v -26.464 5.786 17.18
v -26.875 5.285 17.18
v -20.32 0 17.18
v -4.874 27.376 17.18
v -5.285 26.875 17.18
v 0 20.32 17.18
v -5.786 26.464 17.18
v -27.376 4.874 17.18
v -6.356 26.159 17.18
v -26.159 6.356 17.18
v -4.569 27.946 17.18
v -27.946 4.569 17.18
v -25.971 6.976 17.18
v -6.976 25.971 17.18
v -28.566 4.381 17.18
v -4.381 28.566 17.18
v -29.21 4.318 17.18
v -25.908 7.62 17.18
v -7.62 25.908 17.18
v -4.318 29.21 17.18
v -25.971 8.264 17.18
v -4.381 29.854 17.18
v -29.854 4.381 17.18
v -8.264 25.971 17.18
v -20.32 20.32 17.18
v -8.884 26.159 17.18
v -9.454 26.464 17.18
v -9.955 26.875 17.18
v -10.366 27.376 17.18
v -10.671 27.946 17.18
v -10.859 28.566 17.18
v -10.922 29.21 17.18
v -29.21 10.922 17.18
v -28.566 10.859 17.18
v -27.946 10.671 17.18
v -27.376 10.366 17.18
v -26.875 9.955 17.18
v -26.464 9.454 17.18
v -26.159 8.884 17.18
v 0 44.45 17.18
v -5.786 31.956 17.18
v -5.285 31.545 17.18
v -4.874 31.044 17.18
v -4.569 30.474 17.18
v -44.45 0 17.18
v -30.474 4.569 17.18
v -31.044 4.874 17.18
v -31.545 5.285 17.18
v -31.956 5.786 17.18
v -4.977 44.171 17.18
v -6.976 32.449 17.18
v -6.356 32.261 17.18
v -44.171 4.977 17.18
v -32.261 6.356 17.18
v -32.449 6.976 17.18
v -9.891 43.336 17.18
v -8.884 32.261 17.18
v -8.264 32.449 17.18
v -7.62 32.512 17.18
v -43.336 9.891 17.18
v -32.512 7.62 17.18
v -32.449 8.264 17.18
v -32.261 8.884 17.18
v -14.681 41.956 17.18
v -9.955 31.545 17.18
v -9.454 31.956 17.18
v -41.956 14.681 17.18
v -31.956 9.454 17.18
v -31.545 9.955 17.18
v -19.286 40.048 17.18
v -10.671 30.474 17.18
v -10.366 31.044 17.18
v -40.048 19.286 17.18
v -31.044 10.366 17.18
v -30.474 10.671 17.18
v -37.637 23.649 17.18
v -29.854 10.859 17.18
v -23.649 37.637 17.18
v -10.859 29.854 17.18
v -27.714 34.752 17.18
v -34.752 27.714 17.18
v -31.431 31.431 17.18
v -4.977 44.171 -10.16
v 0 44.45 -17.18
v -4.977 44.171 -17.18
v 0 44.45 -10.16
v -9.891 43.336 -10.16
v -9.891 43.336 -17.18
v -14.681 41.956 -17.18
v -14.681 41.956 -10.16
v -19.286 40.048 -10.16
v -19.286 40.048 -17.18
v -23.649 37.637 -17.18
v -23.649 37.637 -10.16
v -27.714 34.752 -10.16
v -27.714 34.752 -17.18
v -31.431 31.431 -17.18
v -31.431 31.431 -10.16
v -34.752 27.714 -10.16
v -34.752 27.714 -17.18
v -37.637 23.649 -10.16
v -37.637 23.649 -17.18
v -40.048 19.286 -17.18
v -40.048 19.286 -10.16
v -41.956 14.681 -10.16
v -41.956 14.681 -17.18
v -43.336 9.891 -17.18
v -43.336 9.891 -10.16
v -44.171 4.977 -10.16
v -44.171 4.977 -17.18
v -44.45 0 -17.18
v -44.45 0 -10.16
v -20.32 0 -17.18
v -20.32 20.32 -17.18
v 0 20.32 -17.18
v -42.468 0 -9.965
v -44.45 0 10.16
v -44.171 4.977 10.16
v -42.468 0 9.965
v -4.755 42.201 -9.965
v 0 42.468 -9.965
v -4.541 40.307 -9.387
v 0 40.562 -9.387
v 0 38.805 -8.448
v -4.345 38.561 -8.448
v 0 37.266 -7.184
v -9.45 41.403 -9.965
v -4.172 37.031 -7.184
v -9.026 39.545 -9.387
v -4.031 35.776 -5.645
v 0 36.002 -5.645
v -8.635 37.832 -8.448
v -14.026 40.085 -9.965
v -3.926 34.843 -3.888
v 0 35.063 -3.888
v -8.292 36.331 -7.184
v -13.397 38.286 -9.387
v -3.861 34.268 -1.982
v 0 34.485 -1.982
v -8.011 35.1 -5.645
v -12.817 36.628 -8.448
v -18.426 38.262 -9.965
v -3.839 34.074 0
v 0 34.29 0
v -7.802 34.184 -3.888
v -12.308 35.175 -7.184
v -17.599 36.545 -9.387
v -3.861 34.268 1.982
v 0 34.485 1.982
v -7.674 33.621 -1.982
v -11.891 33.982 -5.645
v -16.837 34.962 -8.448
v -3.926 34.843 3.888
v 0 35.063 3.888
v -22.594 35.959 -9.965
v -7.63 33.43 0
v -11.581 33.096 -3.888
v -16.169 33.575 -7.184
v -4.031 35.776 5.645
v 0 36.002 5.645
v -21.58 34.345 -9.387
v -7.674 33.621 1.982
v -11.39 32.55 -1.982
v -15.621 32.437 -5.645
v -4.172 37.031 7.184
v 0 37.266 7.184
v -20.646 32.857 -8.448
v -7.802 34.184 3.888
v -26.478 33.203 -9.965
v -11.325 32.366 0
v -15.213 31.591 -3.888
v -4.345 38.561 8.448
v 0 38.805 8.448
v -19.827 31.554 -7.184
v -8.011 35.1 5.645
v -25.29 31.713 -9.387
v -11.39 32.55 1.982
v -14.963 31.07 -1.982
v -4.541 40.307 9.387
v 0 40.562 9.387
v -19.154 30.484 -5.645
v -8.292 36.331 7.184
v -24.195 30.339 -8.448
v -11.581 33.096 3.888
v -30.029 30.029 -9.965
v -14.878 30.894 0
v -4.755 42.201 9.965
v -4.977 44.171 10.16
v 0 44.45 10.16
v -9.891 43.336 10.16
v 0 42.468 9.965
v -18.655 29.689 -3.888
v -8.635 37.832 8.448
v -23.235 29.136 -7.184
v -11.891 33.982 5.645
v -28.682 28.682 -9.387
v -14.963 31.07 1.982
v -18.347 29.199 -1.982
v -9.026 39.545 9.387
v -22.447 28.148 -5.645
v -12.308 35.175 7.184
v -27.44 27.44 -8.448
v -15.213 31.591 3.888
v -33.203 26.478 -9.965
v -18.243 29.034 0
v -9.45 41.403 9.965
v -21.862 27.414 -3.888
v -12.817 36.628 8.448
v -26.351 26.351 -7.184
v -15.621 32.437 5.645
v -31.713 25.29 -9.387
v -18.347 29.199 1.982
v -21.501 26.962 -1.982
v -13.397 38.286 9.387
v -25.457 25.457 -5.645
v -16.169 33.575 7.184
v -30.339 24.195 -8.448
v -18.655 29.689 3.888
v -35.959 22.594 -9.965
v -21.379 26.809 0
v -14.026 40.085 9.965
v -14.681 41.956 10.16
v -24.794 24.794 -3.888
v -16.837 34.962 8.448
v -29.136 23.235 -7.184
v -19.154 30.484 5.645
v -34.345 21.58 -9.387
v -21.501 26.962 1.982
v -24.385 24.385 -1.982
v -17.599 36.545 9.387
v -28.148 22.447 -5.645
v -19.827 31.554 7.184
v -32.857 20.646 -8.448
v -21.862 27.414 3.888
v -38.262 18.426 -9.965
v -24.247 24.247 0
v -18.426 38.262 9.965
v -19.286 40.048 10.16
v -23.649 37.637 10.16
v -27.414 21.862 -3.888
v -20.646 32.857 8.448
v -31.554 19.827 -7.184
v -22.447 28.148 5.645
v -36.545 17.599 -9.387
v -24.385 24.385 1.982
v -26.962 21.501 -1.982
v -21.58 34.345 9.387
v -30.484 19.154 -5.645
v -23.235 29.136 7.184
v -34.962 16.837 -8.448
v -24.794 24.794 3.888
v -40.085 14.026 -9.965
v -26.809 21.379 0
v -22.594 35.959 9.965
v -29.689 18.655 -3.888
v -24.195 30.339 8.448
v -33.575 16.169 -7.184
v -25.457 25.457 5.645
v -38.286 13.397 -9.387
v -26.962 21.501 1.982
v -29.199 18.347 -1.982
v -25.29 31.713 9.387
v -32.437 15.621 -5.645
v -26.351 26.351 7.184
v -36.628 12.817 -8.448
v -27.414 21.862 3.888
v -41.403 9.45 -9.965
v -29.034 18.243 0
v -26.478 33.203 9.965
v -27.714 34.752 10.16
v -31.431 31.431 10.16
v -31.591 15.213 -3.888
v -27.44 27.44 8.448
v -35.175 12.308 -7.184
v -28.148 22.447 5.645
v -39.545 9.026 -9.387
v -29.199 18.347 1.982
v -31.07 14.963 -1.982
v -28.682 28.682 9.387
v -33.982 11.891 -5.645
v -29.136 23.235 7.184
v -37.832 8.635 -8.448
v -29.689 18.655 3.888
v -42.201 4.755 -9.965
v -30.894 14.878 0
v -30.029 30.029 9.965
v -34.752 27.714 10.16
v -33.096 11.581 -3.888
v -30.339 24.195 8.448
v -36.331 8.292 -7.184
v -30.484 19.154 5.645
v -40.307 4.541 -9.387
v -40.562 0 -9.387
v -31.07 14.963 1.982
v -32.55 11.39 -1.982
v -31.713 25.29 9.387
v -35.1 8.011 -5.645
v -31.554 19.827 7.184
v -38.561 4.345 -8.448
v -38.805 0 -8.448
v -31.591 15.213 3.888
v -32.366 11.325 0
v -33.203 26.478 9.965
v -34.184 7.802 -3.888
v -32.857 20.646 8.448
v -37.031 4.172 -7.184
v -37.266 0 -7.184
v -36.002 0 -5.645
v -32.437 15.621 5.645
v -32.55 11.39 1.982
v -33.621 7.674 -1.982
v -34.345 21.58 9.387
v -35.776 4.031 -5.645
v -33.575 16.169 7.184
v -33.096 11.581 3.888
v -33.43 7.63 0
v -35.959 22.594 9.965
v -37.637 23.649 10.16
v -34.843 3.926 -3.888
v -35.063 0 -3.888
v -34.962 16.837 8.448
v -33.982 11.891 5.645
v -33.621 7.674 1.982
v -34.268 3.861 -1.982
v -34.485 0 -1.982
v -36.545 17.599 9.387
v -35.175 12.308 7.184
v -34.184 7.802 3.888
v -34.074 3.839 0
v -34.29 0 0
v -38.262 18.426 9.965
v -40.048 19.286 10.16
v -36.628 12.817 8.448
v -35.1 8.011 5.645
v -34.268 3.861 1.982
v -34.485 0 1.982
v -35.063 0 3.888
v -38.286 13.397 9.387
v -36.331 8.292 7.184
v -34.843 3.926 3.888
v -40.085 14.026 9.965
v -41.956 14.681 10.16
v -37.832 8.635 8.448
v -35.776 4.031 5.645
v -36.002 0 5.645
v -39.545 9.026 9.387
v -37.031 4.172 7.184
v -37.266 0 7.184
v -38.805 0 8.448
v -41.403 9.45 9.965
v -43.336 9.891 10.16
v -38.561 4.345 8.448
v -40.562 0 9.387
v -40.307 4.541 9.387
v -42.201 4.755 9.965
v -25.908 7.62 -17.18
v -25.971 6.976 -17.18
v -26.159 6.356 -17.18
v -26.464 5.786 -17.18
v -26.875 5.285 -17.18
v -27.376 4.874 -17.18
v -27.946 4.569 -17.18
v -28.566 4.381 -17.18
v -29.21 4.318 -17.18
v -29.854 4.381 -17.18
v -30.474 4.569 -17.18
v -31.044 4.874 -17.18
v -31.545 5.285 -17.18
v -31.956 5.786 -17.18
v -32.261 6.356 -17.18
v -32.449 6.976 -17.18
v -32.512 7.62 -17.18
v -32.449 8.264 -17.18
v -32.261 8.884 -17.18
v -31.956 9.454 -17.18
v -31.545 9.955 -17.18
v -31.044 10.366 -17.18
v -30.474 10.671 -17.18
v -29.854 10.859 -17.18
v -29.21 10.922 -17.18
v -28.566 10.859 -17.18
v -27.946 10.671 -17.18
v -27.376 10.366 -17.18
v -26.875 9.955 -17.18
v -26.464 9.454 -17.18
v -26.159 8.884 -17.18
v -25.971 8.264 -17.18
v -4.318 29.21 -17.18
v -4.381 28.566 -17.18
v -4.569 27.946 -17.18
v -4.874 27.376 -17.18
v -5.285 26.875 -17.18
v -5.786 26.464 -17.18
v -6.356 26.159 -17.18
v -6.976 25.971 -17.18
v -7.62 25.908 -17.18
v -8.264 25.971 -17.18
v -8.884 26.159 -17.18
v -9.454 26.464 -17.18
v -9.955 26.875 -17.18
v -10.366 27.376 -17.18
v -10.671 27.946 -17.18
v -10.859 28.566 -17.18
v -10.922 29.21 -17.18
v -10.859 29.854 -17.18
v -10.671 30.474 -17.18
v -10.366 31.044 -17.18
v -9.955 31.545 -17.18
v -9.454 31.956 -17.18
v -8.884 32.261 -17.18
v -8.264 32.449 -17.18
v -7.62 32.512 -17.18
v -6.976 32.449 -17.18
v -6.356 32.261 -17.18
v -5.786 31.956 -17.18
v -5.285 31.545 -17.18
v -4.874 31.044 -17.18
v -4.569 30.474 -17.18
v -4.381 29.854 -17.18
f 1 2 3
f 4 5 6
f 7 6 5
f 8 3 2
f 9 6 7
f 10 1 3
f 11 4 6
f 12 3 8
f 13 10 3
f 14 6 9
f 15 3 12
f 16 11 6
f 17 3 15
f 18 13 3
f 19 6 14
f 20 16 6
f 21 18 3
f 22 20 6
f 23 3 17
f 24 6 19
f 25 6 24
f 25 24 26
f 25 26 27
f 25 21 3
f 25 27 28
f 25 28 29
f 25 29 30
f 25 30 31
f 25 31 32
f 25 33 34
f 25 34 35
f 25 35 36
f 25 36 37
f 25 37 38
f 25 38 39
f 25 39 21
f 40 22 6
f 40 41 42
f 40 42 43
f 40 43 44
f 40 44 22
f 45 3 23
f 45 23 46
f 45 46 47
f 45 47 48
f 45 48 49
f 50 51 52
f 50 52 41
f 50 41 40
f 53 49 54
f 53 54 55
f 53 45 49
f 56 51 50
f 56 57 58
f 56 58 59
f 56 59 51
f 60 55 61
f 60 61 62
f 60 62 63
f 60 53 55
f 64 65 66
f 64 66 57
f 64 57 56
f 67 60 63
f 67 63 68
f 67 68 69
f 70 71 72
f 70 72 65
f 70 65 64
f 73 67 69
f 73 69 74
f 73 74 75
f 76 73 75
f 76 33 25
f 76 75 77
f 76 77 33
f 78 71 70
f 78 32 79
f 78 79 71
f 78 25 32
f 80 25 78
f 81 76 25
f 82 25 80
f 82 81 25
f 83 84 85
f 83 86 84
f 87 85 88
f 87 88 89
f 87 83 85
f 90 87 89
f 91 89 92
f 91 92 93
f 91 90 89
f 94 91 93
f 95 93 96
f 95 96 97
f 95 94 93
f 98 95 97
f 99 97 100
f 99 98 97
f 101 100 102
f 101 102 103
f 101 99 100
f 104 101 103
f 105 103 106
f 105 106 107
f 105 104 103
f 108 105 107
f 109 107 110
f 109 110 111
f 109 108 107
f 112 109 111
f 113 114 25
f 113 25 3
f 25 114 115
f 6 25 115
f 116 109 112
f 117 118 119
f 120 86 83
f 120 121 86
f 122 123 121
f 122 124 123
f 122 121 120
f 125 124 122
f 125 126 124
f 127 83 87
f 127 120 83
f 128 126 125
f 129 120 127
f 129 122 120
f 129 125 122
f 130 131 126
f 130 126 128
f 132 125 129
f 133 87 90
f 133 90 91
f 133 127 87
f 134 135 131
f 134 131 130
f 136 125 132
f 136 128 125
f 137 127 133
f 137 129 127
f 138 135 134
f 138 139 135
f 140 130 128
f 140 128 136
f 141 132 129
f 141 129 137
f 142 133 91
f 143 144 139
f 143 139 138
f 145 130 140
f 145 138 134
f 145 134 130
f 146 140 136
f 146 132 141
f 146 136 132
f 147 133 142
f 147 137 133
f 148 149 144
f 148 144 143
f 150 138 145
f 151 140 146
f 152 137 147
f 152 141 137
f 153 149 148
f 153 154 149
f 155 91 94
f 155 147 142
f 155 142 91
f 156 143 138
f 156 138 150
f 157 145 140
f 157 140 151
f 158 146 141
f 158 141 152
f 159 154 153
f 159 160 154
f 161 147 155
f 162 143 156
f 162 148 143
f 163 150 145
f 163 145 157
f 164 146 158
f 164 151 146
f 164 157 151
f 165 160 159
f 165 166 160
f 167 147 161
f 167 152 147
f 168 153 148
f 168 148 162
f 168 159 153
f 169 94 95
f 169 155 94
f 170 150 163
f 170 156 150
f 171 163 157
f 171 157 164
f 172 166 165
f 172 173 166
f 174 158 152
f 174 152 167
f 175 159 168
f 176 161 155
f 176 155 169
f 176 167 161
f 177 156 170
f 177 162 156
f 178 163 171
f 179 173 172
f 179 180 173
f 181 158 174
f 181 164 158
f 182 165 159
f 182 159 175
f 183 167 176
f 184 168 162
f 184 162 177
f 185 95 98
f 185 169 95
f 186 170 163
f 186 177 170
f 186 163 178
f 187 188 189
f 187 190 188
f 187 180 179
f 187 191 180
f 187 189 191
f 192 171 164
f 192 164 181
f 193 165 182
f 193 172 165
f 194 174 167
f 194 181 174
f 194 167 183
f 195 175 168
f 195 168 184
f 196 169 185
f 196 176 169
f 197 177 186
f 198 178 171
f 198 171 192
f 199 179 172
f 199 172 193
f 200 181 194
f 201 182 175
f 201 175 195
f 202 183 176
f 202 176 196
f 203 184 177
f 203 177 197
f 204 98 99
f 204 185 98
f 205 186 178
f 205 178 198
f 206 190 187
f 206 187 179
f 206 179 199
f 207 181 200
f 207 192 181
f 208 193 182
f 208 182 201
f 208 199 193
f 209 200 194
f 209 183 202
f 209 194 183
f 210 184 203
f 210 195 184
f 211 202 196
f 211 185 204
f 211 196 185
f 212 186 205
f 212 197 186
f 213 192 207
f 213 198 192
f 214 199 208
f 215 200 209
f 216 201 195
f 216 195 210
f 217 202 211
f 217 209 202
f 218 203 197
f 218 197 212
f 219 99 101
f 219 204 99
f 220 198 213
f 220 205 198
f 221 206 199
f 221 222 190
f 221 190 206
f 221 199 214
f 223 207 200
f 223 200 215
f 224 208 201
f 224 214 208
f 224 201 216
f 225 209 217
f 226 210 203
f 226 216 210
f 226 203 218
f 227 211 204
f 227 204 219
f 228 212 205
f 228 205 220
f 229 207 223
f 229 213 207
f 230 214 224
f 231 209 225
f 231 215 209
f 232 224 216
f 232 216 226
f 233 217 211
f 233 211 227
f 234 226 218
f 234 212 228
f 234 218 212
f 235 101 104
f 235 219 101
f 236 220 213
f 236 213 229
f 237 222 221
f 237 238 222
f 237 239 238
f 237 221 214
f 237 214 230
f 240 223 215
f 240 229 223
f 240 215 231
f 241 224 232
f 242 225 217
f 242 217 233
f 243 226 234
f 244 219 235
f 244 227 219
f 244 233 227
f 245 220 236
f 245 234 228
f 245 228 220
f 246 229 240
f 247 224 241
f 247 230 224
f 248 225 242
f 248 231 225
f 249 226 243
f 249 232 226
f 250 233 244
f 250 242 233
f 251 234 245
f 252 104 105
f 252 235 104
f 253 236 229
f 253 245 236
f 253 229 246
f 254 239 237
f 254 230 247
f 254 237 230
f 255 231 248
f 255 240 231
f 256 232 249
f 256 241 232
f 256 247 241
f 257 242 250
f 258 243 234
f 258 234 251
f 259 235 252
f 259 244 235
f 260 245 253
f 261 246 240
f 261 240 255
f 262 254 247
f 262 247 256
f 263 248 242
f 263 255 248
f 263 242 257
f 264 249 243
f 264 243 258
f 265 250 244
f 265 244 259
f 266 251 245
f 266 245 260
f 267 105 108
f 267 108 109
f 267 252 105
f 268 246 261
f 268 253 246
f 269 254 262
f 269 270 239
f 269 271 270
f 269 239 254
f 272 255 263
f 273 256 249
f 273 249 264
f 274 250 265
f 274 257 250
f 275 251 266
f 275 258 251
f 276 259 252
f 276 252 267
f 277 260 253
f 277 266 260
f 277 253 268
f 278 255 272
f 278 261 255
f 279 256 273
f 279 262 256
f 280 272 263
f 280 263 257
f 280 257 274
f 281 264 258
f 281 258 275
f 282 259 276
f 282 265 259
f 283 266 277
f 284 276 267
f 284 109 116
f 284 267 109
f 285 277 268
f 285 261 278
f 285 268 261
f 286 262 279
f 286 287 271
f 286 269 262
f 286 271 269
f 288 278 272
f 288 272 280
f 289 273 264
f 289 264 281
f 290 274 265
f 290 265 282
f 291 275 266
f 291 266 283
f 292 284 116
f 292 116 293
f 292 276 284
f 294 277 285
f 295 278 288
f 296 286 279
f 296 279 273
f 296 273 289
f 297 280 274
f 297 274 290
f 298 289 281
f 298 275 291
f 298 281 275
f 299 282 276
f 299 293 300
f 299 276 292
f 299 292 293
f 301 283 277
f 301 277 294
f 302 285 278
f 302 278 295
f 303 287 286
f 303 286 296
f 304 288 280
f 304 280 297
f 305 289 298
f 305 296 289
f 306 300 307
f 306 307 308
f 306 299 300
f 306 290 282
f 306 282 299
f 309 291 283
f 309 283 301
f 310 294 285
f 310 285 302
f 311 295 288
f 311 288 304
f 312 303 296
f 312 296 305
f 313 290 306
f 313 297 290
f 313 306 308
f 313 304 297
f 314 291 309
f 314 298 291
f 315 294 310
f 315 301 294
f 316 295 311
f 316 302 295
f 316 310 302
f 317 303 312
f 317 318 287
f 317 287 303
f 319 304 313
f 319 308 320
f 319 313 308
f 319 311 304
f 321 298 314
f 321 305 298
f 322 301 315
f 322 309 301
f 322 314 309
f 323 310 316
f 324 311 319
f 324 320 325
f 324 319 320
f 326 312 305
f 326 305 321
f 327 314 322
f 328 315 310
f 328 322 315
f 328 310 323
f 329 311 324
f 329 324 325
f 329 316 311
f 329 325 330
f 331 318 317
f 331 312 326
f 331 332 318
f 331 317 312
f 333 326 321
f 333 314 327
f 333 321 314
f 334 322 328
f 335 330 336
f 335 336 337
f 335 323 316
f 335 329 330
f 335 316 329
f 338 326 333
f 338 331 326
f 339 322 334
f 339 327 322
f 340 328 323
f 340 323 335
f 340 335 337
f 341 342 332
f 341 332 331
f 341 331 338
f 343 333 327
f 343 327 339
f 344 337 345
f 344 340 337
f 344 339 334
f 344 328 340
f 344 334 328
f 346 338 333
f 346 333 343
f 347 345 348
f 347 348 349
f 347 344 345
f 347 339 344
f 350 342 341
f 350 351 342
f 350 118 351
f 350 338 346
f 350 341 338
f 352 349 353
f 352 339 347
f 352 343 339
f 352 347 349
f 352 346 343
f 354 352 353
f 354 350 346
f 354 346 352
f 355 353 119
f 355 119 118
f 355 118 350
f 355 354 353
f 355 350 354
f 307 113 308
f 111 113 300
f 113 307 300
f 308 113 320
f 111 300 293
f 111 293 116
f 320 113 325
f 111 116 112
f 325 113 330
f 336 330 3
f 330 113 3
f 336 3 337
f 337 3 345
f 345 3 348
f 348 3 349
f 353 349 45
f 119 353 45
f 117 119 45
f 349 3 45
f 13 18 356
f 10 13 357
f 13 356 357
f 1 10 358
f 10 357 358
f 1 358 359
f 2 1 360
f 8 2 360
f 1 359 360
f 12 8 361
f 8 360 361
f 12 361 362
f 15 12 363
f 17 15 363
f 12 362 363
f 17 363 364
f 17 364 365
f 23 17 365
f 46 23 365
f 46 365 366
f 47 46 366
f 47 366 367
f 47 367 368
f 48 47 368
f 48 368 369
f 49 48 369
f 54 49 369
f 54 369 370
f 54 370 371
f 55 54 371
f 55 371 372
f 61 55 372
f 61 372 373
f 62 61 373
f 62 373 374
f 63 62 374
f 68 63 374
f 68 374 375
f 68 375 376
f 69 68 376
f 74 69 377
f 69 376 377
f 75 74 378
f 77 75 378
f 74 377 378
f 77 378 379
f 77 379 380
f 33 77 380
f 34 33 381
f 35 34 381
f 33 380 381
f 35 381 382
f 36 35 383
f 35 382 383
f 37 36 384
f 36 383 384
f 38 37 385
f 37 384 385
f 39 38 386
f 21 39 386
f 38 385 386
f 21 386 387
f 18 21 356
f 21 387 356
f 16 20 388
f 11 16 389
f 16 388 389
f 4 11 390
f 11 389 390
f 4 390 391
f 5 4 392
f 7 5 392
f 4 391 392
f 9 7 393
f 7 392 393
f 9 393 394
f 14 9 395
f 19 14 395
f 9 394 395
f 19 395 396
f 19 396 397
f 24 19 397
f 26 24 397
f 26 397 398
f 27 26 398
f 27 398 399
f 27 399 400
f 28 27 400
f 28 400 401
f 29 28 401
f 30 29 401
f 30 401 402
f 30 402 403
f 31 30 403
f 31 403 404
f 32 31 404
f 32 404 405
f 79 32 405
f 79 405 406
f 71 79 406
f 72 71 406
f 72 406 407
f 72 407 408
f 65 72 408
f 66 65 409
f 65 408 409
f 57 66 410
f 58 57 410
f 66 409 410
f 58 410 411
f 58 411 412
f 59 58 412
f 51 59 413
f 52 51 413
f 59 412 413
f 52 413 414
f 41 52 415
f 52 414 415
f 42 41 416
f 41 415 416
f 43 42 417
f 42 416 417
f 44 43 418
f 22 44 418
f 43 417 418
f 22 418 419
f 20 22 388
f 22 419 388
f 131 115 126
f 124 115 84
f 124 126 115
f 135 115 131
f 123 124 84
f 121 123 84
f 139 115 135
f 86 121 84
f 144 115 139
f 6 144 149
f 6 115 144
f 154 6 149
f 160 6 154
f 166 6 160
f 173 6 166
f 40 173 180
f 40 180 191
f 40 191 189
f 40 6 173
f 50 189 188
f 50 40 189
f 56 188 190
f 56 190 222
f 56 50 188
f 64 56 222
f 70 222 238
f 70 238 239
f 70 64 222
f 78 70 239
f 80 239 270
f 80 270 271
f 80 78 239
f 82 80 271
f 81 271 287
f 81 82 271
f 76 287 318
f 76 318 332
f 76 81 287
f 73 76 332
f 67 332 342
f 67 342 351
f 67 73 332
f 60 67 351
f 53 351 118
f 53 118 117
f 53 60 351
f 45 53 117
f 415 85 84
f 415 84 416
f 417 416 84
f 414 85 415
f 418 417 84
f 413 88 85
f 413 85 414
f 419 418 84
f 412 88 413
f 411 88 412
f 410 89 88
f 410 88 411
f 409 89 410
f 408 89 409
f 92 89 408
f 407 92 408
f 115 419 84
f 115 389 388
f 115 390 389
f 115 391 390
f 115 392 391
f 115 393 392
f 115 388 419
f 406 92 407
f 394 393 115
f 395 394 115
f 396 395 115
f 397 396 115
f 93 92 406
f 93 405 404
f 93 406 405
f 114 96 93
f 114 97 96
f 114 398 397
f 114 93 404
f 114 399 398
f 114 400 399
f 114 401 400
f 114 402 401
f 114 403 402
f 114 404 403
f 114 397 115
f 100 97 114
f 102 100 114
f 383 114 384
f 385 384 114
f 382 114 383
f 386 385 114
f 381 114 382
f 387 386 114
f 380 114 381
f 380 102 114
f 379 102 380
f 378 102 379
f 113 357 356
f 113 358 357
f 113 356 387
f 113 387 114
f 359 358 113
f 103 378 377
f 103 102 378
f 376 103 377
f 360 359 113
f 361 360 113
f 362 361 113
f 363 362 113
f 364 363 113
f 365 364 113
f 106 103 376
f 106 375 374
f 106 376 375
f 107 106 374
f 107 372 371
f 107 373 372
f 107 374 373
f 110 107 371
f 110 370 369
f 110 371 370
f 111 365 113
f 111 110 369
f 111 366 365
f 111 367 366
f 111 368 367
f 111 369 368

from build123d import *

# Parameters (mm, degrees)
F2_ANGLE = 90
F0_W     = 20.32
F0_H     = 20.32
F3_DEPTH = 34.361461
F4_R     = 3.302
F5_DEPTH = 34.361461


with BuildPart() as f2:
    # F1 (on Right) → F2 (revolve)
    with BuildSketch(Plane.YZ):
        with BuildLine():
            ThreePointArc((44.45, -10.16), (34.29, 0), (44.45, 10.16))
            Line((44.45, 10.16), (44.45, 17.18023))
            Line((44.45, 17.18023), (0, 17.18023))
            Line((0, 17.18023), (0, 0))
            Line((0, 0), (0, -17.18023))
            Line((0, -17.18023), (44.45, -17.18023))
            Line((44.45, -17.18023), (44.45, -10.16))
        make_face()
    revolve(axis=Axis((0, 0, 26.599785), (0, 0, 1)), revolution_arc=F2_ANGLE)

    # F0 (on face) → F3 (cut, through all)
    with BuildSketch(Plane(origin=(0, 0, -17.18023), x_dir=(1, 0, 0), z_dir=(0, 0, -1))):
        with Locations((-10.16, -10.16)):
            Rectangle(F0_W, F0_H)
    extrude(amount=-F3_DEPTH, mode=Mode.SUBTRACT)

    # F4 (on face) → F5 (cut, through all)
    with BuildSketch(Plane(origin=(0, 0, -17.18023), x_dir=(1, 0, 0), z_dir=(0, 0, -1))):
        with Locations((-29.21, -7.62)):
            Circle(F4_R)
        with Locations((-7.62, -29.21)):
            Circle(F4_R)
    extrude(amount=-F5_DEPTH, mode=Mode.SUBTRACT)


solid = f2.part
